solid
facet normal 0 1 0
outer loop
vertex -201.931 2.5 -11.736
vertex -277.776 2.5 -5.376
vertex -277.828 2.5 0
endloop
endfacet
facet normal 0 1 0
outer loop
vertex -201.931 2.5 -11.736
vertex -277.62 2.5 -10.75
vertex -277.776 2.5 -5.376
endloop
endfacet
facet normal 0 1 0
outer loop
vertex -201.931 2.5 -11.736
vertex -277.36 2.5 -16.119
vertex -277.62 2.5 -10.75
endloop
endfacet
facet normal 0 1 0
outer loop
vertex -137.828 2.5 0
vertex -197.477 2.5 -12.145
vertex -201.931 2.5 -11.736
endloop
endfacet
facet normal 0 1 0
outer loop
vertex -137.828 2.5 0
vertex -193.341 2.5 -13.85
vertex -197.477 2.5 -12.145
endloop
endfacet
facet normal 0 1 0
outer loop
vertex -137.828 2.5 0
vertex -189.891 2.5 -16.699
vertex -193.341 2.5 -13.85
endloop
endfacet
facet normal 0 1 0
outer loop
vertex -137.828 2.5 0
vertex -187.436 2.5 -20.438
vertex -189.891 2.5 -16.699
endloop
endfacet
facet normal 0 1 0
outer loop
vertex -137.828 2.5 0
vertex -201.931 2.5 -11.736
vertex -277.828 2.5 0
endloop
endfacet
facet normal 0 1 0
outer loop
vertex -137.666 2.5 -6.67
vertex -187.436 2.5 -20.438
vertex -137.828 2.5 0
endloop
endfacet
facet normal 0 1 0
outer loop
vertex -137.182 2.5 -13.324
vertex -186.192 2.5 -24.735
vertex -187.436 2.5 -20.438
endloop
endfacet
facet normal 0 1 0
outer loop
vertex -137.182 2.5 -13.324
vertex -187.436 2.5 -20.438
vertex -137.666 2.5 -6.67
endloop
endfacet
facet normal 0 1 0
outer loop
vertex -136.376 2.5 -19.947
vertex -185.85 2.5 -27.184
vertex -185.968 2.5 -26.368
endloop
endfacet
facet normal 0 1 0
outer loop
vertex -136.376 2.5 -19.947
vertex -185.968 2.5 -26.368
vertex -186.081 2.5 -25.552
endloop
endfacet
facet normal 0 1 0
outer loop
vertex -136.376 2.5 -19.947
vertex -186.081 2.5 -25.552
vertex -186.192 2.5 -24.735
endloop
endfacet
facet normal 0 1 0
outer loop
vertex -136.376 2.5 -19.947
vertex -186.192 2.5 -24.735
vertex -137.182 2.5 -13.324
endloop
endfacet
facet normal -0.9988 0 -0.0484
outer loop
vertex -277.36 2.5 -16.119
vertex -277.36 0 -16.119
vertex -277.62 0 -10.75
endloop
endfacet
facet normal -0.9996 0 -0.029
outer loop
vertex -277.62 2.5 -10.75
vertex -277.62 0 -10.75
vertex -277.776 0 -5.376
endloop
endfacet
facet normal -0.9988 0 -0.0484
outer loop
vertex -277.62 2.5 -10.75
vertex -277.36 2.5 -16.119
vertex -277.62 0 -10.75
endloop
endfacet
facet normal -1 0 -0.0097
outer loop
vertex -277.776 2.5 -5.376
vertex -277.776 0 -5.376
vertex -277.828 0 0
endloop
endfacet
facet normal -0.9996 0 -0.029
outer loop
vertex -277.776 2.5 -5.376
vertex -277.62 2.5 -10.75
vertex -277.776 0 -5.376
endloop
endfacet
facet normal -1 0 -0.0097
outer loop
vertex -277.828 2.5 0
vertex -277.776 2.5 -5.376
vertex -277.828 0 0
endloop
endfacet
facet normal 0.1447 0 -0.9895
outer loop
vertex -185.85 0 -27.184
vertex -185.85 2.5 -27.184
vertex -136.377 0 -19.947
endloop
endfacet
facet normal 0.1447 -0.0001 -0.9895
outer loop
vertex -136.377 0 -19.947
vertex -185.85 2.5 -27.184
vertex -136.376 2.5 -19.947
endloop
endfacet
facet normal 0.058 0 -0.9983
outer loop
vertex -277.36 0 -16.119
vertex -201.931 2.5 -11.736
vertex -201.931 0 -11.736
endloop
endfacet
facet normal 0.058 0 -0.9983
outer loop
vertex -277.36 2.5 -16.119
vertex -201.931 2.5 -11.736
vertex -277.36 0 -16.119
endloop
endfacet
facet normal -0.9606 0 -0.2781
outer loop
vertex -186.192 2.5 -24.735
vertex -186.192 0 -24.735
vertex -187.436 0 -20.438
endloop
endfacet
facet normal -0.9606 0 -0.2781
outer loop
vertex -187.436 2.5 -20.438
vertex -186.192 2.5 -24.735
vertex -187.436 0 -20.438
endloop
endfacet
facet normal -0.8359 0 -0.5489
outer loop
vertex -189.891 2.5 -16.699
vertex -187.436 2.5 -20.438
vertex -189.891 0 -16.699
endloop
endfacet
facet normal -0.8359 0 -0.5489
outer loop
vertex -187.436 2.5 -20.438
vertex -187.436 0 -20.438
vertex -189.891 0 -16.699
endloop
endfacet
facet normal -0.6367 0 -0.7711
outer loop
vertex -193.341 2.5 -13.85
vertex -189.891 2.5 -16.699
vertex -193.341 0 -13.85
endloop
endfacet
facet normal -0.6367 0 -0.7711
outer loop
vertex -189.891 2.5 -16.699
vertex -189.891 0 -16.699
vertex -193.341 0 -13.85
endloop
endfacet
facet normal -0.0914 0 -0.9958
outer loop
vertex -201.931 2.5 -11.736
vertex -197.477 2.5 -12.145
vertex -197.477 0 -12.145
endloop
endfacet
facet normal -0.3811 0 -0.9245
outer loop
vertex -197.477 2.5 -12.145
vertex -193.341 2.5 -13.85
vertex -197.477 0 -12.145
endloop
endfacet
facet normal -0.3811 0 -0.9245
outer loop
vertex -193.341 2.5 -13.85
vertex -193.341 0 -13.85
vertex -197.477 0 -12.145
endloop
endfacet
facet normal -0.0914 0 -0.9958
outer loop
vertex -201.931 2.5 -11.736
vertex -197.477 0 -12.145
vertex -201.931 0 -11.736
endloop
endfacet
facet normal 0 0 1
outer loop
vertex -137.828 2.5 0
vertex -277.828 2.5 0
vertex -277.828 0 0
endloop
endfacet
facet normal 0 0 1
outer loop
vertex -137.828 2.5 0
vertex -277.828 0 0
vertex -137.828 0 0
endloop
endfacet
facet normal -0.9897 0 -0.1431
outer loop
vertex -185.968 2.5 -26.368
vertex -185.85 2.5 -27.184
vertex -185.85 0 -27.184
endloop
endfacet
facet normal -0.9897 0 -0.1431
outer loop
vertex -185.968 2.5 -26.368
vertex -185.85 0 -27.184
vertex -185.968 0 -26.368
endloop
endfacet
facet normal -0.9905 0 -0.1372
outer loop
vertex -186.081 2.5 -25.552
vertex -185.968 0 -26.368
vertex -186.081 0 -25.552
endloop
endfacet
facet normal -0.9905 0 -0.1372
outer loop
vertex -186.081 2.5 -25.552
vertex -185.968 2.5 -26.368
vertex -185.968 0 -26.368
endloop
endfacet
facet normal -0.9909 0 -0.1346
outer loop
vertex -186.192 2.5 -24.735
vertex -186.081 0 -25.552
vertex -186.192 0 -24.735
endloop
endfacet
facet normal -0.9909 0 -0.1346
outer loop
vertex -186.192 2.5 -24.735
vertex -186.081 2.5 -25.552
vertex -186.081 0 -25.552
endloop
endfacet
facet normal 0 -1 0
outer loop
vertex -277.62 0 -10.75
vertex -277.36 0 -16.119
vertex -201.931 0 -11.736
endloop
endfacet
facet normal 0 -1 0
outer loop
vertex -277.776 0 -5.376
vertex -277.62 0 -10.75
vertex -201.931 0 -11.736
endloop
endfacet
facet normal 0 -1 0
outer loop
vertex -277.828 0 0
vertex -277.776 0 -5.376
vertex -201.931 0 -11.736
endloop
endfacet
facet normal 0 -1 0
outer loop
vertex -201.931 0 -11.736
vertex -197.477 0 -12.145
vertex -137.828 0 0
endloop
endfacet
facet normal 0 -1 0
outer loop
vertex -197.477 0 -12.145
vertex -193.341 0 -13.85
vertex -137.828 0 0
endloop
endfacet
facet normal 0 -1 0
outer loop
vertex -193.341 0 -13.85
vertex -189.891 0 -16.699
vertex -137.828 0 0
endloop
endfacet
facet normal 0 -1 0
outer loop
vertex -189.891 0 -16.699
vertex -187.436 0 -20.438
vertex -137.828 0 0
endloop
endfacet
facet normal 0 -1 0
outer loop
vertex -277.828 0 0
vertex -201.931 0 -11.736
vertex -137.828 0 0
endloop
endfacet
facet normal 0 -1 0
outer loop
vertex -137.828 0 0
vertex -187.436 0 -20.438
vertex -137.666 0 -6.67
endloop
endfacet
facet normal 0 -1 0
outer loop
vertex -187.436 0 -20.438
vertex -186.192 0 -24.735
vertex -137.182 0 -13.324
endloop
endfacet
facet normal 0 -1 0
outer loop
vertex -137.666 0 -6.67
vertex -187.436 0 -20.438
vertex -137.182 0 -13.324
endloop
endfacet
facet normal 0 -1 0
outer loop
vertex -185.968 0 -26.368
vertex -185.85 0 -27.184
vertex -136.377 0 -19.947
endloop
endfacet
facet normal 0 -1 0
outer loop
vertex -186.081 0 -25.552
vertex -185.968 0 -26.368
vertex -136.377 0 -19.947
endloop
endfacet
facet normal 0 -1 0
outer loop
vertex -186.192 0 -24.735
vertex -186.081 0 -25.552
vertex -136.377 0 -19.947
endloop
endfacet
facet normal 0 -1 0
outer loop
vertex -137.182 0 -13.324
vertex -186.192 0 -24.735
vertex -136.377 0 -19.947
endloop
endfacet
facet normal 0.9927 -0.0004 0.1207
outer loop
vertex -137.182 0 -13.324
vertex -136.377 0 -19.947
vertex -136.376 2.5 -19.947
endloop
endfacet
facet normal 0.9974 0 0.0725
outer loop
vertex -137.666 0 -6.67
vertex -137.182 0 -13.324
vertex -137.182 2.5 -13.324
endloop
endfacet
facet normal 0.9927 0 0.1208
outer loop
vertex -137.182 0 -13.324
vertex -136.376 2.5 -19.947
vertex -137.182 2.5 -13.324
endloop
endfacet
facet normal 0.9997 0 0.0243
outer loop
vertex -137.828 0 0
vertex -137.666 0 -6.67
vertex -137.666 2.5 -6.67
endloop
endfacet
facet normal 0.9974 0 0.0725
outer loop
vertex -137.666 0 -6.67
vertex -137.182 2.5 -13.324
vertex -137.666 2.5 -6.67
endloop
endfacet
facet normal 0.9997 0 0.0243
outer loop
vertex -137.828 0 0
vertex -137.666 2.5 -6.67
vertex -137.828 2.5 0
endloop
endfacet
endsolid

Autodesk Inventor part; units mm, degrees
ref_plane "YZ Plane" through (0, 0, 0) normal (1, 0, 0) x (0, 1, 0)
ref_plane "XZ Plane" through (0, 0, 0) normal (0, 1, 0) x (-1, 0, 0)
ref_plane "XY Plane" through (0, 0, 0) normal (0, 0, 1) x (1, 0, 0)
sketch "スケッチ1" plane through (0, 0, 0) normal (0, 1, 0) x (-1, 0, 0)
  circle A0 centre (0, 0) radius 178.1675
  circle A1 centre (0, 0) radius 157.8276
  line L0 (168.1877, 0) -> (166.7488, -21.9529)
  line L1 (168.1877, 0) -> (130.1721, 2.4917) construction
  line L2 (249.4344, 0) -> (-249.4344, 0) projected
  line L3 (166.7488, -21.9529) -> (156.7702, -21.2989)
  line L4 (156.7702, -21.2989) -> (158.2091, 0.654) construction
  line L5 (158.2091, 0.654) -> (168.1877, 0)
  line L6 (157.4896, -10.3224) -> (0, 0)
  line L7 (166.7488, -21.9529) -> (162.4568, -43.5302)
  line L8 (162.4568, -43.5302) -> (152.649, -41.5793) construction
  line L9 (152.649, -41.5793) -> (156.9409, -20.002) construction
  line L10 (156.9409, -20.002) -> (166.7488, -21.9529) construction
  line L11 (162.4568, -43.5302) -> (155.3851, -64.3626)
  line L12 (155.3851, -64.3626) -> (145.9158, -61.1482) construction
  line L13 (145.9158, -61.1482) -> (152.9875, -40.3158) construction
  line L14 (152.9875, -40.3158) -> (162.4568, -43.5302) construction
  line L15 (155.3851, -64.3626) -> (145.6548, -84.0938)
  line L16 (145.6548, -84.0938) -> (136.6861, -79.6709) construction
  line L17 (136.6861, -79.6709) -> (146.4164, -59.9397) construction
  line L18 (146.4164, -59.9397) -> (155.3851, -64.3626) construction
  line L19 (0, 0) -> (111.6009, -111.6009)
  line L20 (145.6548, -84.0938) -> (137.3401, -78.5381) construction
  line L21 (137.3401, -78.5381) -> (125.1176, -96.8305) construction
  line L22 (125.1176, -96.8305) -> (133.4323, -102.3862) construction
  line L23 (133.4323, -102.3862) -> (145.6548, -84.0938)
  line L24 (133.4323, -102.3862) -> (125.9139, -95.7927) construction
  line L25 (125.9139, -95.7927) -> (111.4082, -112.3332) construction
  line L26 (111.4082, -112.3332) -> (118.9266, -118.9266)
  line L27 (118.9266, -118.9266) -> (133.4323, -102.3862)
  line L28 (111.6009, -111.6009) -> (118.9266, -118.9266)
  line L29 (166.7488, -21.9529) -> (176.7274, -22.6069) construction
  line L30 (118.9266, -118.9266) -> (125.9834, -125.9834)
  point P0 (154.795, -30.7906)
  point P1 (149.4517, -50.732)
  point P2 (141.5512, -69.8053)
  point P3 (131.2288, -87.6843)
  point P4 (118.661, -104.0629)
  point P5 (157.8276, 0)
  point P6 (178.1675, 0)
  dimension "d0" = 22
  dimension "d1" = 10
  dimension "d2" = 45
  dimension "d4" = 315.6551
extrude "押し出し1" add sketch "スケッチ1" along normal blind 2.5 contours L30 L27 L23 L15 L11 L7 L0 L2 A0 | L28 A1 L2 L0 L7 L11 L15 L23 L27
sketch "スケッチ2" plane through (0, 2.5, 0) normal (0, 1, 0) x (1, 0, 0)
  circle A0 centre (0, 0) radius 277.8276
  line L0 (-168.1877, 0) -> (-166.7488, 21.9529) projected
  line L1 (-166.7488, 21.9529) -> (-162.4568, 43.5302) projected
  line L2 (-162.4568, 43.5302) -> (-155.3851, 64.3626) projected
  line L3 (-155.3851, 64.3626) -> (-145.6548, 84.0938) projected
  line L4 (-133.4323, 102.3862) -> (-145.6548, 84.0938) projected
  line L5 (-118.9266, 118.9266) -> (-133.4323, 102.3862) projected
  line L6 (-167.4682, 10.9764) -> (-166.0294, 32.9293)
  line L7 (-166.0294, 32.9293) -> (-275.7938, 40.1237)
  line L8 (-275.7938, 40.1237) -> (-277.2327, 18.1708)
  line L9 (-277.2327, 18.1708) -> (-167.4682, 10.9764)
  line L10 (-164.6028, 32.7415) -> (-160.3108, 54.3188)
  line L11 (-160.3108, 54.3188) -> (-268.1972, 75.7787)
  line L12 (-268.1972, 75.7787) -> (-272.4892, 54.2015)
  line L13 (-272.4892, 54.2015) -> (-164.6028, 32.7415)
  circle A1 centre (-166.7488, 21.9529) radius 11
  circle A2 centre (-162.4568, 43.5302) radius 11
  line L14 (-158.921, 53.9464) -> (-151.8493, 74.7789)
  line L15 (-151.8493, 74.7789) -> (-256.0116, 110.1372)
  line L16 (-256.0116, 110.1372) -> (-263.0833, 89.3047)
  line L17 (-263.0833, 89.3047) -> (-158.921, 53.9464)
  circle A3 centre (-155.3851, 64.3626) radius 11
  arc A4 (-275.7591, 62.4834) -> (-281.3553, 41.7349) centre (-166.7488, 21.9529) ccw
  line L18 (-178.1663, 0.654) -> (-158.2091, -0.654)
  line L19 (-158.2091, -0.654) -> (-156.7702, 21.2989)
  line L20 (-156.7702, 21.2989) -> (-176.7274, 22.6069)
  line L21 (-176.7274, 22.6069) -> (-178.1663, 0.654)
  line L22 (-177.4468, 11.6305) -> (-275.7938, 40.1237)
  line L23 (-176.7274, 22.6069) -> (-176.008, 33.5834)
  line L24 (-176.008, 33.5834) -> (-275.7591, 62.4834)
  line L25 (-275.7938, 40.1237) -> (-281.3553, 41.7349)
  circle A5 centre (0, 0) radius 137.8276
  line L26 (0, 0) -> (-196.4538, 196.4538)
  line L27 (-111.6009, 111.6009) -> (-125.9834, 125.9834) projected
  line L28 (-411.1762, 0) -> (411.1762, 0) projected
  circle A6 centre (0, 0) radius 257.8276 construction
  arc A7 (-111.6009, 111.6009) -> (-157.8276, 0) centre (0, 0) ccw projected
  point P0 (-158.1662, 0)
  point P1 (-137.8276, 0)
  point P2 (-97.4588, 97.4588)
  point P3 (-277.8276, 0)
  dimension "d7" = 22
  dimension "d10" = 20
  dimension "d11" = 100
  dimension "d12" = 20
  dimension "d14" = 20
  dimension "d17" = 100
extrude "押し出し2" add sketch "スケッチ2" against normal blind 2.5 contours L26 L5 L4 L3 A3 L15 A0 | A0 L9 L21 L18 L28 | L15 A3 L17 A0 | A0 L22 L9 | L18 L21 L9 L0 | L0 A1 L19 L28 | A5 L28 A7 A1 A2 A3 L26 | L17 A2 L11 A0 | A3 L3 L14 | L14 L2 A3 | L26 A7 A3 L3 L4 L5 | A0 L7 L23 A1 L21 L22 | L21 A1 L9 | A1 L21 L20 L0 | L0 L20 L19 A1 | L19 A7 L28 | L11 A2 L13 L24 A0 | A2 A7 L1 L2 | L2 L10 A2 | A3 A7 A2 | L2 L3 A3 A7 | A0 L13 L24 L7 | A1 L23 L21 | L6 A1 L1 | L20 L23 A1 L6 | L1 A1 A7 L19 L20 | A1 A7 L19 | A3 A7 | L24 L13 A0 | L10 L1 A2 | A2 A7 | L24 L13 A1 L7 | L7 A1 L23 | A2 A7 A1 | A7 A1
sketch "スケッチ4" plane through (0, 2.5, 0) normal (0, 1, 0) x (1, 0, 0)
  circle A0 centre (0, 0) radius 187.8276
  arc A1 (-97.4588, 97.4588) -> (-137.8276, 0) centre (0, 0) ccw projected
  line L0 (-137.5954, 7.9966) -> (-277.3596, 16.1193)
  line L1 (-137.5954, 7.9966) -> (-137.8276, 0)
  arc A2 (-196.4538, 196.4538) -> (-277.8276, 0) centre (0, 0) ccw projected
  line L2 (-137.8276, 0) -> (-128.5432, -0.2696)
  line L3 (-185.8501, 27.1836) -> (-136.3765, 19.9473)
  line L4 (-136.3765, 19.9473) -> (-137.8276, 0)
  line L5 (-120.1573, -1.2854) -> (-137.8276, 0)
  line L6 (-97.4588, 97.4588) -> (-196.4538, 196.4538) projected
  point P0 (-187.5112, 10.8976)
  dimension "d23" = 50
  dimension "d24" = 8
  dimension "d25" = 20
extrude "押し出し4" cut sketch "スケッチ4" against normal through all contours L6 A1 L3 A0 | A0 L0 A2 L6
fillet "フィレット2" radius 15 1 edges at (-187.5112, 1.25, -10.8976)
properties material "木材 (カエデ材)"
